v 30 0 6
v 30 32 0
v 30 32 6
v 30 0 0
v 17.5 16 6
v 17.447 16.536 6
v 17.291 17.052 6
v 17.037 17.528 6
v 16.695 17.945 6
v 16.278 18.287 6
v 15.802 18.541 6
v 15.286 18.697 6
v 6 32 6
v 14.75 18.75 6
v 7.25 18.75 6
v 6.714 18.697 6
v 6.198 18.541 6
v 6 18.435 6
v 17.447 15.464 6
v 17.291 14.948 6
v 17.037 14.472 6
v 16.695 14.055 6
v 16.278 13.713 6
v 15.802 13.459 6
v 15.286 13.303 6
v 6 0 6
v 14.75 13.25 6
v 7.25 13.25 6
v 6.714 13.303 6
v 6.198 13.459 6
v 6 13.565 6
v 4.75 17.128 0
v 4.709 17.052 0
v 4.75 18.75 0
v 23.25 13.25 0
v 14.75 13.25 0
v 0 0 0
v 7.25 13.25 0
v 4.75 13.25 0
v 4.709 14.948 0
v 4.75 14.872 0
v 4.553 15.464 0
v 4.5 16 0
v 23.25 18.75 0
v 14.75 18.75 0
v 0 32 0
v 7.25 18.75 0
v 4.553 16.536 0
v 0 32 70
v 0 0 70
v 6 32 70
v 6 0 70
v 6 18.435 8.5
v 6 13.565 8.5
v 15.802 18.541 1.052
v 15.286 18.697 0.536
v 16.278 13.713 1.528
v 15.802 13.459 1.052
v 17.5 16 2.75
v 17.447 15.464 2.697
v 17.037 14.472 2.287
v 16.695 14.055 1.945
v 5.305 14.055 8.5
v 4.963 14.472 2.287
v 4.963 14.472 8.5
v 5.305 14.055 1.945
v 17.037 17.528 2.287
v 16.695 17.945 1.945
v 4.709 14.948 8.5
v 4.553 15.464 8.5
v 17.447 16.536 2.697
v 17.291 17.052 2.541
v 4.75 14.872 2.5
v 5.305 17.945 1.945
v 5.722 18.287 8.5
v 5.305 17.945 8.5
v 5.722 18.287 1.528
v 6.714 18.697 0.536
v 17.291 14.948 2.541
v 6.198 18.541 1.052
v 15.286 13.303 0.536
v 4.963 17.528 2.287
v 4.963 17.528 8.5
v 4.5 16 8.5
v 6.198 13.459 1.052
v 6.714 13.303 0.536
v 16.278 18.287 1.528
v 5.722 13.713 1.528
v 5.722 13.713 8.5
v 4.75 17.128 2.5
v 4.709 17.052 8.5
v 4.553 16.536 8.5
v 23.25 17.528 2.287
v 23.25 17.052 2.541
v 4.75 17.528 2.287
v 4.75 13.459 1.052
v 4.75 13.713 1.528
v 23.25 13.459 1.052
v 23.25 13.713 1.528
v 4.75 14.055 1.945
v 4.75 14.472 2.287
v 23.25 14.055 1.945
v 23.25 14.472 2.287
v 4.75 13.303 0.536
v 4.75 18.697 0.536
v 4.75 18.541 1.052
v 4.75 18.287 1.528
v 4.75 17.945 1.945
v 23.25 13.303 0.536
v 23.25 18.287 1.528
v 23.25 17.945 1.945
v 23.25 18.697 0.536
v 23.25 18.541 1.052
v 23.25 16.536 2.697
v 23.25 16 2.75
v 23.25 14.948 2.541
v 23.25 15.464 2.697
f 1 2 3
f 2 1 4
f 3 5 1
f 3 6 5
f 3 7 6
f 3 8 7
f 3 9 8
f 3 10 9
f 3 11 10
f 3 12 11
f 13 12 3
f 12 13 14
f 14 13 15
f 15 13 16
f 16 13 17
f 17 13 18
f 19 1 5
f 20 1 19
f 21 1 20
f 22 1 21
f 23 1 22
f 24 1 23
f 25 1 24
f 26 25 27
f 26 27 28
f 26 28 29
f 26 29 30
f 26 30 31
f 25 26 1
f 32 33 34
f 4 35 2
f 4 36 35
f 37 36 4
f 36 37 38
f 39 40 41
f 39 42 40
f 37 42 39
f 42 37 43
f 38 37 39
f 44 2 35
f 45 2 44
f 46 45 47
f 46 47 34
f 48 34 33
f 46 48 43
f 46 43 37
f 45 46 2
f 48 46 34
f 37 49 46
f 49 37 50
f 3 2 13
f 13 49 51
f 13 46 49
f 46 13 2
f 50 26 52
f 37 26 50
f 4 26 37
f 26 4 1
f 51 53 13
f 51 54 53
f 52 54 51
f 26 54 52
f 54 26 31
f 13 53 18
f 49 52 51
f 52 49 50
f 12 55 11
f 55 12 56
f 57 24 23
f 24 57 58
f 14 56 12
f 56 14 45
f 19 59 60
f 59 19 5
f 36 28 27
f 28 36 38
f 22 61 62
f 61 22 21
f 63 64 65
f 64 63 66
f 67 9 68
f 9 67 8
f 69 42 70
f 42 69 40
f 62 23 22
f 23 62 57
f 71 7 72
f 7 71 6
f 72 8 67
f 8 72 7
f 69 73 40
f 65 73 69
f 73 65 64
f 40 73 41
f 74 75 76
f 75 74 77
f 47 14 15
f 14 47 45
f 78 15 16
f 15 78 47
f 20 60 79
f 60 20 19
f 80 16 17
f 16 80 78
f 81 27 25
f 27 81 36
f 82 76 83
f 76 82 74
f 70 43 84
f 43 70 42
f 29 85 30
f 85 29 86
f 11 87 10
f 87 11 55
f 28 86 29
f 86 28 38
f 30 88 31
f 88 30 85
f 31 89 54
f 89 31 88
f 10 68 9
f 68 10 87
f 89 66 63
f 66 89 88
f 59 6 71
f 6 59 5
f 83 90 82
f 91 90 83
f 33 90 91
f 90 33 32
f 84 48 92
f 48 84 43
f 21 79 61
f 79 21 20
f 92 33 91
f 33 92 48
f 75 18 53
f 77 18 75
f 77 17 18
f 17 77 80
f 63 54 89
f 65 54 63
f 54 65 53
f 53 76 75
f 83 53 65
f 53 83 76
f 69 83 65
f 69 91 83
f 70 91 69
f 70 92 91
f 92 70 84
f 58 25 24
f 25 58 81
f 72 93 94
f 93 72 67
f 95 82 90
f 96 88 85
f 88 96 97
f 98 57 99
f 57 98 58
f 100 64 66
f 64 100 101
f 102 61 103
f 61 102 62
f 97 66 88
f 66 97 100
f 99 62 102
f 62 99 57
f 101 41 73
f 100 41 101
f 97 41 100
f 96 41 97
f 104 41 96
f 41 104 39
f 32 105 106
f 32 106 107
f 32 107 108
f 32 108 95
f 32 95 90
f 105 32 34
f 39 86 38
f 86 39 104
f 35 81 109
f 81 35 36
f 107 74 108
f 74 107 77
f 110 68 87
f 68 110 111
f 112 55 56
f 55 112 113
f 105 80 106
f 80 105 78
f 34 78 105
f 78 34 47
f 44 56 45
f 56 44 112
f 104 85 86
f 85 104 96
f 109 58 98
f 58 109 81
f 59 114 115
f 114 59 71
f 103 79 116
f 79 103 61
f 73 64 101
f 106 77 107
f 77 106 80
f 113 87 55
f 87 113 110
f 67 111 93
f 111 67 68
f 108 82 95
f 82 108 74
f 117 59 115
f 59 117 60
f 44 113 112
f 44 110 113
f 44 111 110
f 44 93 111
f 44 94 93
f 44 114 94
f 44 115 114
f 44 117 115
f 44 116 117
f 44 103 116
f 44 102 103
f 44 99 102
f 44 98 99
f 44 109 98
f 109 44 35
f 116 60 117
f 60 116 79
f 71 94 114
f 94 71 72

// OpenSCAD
$fn = 32;

// ----------------------------------------------------------------------
// L-bracket: 30 x 32 x 70 mm
// ----------------------------------------------------------------------

// --- parameters (mm) ---
arm_x = 30;               // horizontal leg, X
arm_z = 70;               // vertical leg, Z
width = 32;               // bracket depth, Y
wall = 6;                 // plate thickness
hole_d = 5.5;             // clearance for M5
slot_w = 5.5;             // euro screw slot width
slot_l = 13;              // euro screw slot length

module hole_z(px, py) {
  translate([px, py, -2.5]) cylinder(h = wall + 5, d = hole_d);
}
module hole_x(pz, py) {
  translate([-2.5, py, pz]) rotate([0, 90, 0]) cylinder(h = wall + 5, d = hole_d);
}
module euro_slot_z(px, py) {
  hull() {
    translate([px - (slot_l - slot_w) / 2, py, -2.5]) cylinder(h = wall + 5, d = slot_w);
    translate([px + (slot_l - slot_w) / 2, py, -2.5]) cylinder(h = wall + 5, d = slot_w);
  }
}
module euro_slot_x(pz, py) {
  translate([-2.5, 0, 0]) rotate([0, 90, 0]) hull() {
    translate([0, py, pz - (slot_l - slot_w) / 2]) cylinder(h = wall + 5, d = slot_w);
    translate([0, py, pz + (slot_l - slot_w) / 2]) cylinder(h = wall + 5, d = slot_w);
  }
}

difference() {
  union() {
    /* horizontal leg */
    cube([arm_x, width, wall]);
    /* vertical leg, overlapping the corner block */
    cube([wall, width, arm_z]);
  }
  euro_slot_z(11, 16);
  euro_slot_x(11, 16);
}
